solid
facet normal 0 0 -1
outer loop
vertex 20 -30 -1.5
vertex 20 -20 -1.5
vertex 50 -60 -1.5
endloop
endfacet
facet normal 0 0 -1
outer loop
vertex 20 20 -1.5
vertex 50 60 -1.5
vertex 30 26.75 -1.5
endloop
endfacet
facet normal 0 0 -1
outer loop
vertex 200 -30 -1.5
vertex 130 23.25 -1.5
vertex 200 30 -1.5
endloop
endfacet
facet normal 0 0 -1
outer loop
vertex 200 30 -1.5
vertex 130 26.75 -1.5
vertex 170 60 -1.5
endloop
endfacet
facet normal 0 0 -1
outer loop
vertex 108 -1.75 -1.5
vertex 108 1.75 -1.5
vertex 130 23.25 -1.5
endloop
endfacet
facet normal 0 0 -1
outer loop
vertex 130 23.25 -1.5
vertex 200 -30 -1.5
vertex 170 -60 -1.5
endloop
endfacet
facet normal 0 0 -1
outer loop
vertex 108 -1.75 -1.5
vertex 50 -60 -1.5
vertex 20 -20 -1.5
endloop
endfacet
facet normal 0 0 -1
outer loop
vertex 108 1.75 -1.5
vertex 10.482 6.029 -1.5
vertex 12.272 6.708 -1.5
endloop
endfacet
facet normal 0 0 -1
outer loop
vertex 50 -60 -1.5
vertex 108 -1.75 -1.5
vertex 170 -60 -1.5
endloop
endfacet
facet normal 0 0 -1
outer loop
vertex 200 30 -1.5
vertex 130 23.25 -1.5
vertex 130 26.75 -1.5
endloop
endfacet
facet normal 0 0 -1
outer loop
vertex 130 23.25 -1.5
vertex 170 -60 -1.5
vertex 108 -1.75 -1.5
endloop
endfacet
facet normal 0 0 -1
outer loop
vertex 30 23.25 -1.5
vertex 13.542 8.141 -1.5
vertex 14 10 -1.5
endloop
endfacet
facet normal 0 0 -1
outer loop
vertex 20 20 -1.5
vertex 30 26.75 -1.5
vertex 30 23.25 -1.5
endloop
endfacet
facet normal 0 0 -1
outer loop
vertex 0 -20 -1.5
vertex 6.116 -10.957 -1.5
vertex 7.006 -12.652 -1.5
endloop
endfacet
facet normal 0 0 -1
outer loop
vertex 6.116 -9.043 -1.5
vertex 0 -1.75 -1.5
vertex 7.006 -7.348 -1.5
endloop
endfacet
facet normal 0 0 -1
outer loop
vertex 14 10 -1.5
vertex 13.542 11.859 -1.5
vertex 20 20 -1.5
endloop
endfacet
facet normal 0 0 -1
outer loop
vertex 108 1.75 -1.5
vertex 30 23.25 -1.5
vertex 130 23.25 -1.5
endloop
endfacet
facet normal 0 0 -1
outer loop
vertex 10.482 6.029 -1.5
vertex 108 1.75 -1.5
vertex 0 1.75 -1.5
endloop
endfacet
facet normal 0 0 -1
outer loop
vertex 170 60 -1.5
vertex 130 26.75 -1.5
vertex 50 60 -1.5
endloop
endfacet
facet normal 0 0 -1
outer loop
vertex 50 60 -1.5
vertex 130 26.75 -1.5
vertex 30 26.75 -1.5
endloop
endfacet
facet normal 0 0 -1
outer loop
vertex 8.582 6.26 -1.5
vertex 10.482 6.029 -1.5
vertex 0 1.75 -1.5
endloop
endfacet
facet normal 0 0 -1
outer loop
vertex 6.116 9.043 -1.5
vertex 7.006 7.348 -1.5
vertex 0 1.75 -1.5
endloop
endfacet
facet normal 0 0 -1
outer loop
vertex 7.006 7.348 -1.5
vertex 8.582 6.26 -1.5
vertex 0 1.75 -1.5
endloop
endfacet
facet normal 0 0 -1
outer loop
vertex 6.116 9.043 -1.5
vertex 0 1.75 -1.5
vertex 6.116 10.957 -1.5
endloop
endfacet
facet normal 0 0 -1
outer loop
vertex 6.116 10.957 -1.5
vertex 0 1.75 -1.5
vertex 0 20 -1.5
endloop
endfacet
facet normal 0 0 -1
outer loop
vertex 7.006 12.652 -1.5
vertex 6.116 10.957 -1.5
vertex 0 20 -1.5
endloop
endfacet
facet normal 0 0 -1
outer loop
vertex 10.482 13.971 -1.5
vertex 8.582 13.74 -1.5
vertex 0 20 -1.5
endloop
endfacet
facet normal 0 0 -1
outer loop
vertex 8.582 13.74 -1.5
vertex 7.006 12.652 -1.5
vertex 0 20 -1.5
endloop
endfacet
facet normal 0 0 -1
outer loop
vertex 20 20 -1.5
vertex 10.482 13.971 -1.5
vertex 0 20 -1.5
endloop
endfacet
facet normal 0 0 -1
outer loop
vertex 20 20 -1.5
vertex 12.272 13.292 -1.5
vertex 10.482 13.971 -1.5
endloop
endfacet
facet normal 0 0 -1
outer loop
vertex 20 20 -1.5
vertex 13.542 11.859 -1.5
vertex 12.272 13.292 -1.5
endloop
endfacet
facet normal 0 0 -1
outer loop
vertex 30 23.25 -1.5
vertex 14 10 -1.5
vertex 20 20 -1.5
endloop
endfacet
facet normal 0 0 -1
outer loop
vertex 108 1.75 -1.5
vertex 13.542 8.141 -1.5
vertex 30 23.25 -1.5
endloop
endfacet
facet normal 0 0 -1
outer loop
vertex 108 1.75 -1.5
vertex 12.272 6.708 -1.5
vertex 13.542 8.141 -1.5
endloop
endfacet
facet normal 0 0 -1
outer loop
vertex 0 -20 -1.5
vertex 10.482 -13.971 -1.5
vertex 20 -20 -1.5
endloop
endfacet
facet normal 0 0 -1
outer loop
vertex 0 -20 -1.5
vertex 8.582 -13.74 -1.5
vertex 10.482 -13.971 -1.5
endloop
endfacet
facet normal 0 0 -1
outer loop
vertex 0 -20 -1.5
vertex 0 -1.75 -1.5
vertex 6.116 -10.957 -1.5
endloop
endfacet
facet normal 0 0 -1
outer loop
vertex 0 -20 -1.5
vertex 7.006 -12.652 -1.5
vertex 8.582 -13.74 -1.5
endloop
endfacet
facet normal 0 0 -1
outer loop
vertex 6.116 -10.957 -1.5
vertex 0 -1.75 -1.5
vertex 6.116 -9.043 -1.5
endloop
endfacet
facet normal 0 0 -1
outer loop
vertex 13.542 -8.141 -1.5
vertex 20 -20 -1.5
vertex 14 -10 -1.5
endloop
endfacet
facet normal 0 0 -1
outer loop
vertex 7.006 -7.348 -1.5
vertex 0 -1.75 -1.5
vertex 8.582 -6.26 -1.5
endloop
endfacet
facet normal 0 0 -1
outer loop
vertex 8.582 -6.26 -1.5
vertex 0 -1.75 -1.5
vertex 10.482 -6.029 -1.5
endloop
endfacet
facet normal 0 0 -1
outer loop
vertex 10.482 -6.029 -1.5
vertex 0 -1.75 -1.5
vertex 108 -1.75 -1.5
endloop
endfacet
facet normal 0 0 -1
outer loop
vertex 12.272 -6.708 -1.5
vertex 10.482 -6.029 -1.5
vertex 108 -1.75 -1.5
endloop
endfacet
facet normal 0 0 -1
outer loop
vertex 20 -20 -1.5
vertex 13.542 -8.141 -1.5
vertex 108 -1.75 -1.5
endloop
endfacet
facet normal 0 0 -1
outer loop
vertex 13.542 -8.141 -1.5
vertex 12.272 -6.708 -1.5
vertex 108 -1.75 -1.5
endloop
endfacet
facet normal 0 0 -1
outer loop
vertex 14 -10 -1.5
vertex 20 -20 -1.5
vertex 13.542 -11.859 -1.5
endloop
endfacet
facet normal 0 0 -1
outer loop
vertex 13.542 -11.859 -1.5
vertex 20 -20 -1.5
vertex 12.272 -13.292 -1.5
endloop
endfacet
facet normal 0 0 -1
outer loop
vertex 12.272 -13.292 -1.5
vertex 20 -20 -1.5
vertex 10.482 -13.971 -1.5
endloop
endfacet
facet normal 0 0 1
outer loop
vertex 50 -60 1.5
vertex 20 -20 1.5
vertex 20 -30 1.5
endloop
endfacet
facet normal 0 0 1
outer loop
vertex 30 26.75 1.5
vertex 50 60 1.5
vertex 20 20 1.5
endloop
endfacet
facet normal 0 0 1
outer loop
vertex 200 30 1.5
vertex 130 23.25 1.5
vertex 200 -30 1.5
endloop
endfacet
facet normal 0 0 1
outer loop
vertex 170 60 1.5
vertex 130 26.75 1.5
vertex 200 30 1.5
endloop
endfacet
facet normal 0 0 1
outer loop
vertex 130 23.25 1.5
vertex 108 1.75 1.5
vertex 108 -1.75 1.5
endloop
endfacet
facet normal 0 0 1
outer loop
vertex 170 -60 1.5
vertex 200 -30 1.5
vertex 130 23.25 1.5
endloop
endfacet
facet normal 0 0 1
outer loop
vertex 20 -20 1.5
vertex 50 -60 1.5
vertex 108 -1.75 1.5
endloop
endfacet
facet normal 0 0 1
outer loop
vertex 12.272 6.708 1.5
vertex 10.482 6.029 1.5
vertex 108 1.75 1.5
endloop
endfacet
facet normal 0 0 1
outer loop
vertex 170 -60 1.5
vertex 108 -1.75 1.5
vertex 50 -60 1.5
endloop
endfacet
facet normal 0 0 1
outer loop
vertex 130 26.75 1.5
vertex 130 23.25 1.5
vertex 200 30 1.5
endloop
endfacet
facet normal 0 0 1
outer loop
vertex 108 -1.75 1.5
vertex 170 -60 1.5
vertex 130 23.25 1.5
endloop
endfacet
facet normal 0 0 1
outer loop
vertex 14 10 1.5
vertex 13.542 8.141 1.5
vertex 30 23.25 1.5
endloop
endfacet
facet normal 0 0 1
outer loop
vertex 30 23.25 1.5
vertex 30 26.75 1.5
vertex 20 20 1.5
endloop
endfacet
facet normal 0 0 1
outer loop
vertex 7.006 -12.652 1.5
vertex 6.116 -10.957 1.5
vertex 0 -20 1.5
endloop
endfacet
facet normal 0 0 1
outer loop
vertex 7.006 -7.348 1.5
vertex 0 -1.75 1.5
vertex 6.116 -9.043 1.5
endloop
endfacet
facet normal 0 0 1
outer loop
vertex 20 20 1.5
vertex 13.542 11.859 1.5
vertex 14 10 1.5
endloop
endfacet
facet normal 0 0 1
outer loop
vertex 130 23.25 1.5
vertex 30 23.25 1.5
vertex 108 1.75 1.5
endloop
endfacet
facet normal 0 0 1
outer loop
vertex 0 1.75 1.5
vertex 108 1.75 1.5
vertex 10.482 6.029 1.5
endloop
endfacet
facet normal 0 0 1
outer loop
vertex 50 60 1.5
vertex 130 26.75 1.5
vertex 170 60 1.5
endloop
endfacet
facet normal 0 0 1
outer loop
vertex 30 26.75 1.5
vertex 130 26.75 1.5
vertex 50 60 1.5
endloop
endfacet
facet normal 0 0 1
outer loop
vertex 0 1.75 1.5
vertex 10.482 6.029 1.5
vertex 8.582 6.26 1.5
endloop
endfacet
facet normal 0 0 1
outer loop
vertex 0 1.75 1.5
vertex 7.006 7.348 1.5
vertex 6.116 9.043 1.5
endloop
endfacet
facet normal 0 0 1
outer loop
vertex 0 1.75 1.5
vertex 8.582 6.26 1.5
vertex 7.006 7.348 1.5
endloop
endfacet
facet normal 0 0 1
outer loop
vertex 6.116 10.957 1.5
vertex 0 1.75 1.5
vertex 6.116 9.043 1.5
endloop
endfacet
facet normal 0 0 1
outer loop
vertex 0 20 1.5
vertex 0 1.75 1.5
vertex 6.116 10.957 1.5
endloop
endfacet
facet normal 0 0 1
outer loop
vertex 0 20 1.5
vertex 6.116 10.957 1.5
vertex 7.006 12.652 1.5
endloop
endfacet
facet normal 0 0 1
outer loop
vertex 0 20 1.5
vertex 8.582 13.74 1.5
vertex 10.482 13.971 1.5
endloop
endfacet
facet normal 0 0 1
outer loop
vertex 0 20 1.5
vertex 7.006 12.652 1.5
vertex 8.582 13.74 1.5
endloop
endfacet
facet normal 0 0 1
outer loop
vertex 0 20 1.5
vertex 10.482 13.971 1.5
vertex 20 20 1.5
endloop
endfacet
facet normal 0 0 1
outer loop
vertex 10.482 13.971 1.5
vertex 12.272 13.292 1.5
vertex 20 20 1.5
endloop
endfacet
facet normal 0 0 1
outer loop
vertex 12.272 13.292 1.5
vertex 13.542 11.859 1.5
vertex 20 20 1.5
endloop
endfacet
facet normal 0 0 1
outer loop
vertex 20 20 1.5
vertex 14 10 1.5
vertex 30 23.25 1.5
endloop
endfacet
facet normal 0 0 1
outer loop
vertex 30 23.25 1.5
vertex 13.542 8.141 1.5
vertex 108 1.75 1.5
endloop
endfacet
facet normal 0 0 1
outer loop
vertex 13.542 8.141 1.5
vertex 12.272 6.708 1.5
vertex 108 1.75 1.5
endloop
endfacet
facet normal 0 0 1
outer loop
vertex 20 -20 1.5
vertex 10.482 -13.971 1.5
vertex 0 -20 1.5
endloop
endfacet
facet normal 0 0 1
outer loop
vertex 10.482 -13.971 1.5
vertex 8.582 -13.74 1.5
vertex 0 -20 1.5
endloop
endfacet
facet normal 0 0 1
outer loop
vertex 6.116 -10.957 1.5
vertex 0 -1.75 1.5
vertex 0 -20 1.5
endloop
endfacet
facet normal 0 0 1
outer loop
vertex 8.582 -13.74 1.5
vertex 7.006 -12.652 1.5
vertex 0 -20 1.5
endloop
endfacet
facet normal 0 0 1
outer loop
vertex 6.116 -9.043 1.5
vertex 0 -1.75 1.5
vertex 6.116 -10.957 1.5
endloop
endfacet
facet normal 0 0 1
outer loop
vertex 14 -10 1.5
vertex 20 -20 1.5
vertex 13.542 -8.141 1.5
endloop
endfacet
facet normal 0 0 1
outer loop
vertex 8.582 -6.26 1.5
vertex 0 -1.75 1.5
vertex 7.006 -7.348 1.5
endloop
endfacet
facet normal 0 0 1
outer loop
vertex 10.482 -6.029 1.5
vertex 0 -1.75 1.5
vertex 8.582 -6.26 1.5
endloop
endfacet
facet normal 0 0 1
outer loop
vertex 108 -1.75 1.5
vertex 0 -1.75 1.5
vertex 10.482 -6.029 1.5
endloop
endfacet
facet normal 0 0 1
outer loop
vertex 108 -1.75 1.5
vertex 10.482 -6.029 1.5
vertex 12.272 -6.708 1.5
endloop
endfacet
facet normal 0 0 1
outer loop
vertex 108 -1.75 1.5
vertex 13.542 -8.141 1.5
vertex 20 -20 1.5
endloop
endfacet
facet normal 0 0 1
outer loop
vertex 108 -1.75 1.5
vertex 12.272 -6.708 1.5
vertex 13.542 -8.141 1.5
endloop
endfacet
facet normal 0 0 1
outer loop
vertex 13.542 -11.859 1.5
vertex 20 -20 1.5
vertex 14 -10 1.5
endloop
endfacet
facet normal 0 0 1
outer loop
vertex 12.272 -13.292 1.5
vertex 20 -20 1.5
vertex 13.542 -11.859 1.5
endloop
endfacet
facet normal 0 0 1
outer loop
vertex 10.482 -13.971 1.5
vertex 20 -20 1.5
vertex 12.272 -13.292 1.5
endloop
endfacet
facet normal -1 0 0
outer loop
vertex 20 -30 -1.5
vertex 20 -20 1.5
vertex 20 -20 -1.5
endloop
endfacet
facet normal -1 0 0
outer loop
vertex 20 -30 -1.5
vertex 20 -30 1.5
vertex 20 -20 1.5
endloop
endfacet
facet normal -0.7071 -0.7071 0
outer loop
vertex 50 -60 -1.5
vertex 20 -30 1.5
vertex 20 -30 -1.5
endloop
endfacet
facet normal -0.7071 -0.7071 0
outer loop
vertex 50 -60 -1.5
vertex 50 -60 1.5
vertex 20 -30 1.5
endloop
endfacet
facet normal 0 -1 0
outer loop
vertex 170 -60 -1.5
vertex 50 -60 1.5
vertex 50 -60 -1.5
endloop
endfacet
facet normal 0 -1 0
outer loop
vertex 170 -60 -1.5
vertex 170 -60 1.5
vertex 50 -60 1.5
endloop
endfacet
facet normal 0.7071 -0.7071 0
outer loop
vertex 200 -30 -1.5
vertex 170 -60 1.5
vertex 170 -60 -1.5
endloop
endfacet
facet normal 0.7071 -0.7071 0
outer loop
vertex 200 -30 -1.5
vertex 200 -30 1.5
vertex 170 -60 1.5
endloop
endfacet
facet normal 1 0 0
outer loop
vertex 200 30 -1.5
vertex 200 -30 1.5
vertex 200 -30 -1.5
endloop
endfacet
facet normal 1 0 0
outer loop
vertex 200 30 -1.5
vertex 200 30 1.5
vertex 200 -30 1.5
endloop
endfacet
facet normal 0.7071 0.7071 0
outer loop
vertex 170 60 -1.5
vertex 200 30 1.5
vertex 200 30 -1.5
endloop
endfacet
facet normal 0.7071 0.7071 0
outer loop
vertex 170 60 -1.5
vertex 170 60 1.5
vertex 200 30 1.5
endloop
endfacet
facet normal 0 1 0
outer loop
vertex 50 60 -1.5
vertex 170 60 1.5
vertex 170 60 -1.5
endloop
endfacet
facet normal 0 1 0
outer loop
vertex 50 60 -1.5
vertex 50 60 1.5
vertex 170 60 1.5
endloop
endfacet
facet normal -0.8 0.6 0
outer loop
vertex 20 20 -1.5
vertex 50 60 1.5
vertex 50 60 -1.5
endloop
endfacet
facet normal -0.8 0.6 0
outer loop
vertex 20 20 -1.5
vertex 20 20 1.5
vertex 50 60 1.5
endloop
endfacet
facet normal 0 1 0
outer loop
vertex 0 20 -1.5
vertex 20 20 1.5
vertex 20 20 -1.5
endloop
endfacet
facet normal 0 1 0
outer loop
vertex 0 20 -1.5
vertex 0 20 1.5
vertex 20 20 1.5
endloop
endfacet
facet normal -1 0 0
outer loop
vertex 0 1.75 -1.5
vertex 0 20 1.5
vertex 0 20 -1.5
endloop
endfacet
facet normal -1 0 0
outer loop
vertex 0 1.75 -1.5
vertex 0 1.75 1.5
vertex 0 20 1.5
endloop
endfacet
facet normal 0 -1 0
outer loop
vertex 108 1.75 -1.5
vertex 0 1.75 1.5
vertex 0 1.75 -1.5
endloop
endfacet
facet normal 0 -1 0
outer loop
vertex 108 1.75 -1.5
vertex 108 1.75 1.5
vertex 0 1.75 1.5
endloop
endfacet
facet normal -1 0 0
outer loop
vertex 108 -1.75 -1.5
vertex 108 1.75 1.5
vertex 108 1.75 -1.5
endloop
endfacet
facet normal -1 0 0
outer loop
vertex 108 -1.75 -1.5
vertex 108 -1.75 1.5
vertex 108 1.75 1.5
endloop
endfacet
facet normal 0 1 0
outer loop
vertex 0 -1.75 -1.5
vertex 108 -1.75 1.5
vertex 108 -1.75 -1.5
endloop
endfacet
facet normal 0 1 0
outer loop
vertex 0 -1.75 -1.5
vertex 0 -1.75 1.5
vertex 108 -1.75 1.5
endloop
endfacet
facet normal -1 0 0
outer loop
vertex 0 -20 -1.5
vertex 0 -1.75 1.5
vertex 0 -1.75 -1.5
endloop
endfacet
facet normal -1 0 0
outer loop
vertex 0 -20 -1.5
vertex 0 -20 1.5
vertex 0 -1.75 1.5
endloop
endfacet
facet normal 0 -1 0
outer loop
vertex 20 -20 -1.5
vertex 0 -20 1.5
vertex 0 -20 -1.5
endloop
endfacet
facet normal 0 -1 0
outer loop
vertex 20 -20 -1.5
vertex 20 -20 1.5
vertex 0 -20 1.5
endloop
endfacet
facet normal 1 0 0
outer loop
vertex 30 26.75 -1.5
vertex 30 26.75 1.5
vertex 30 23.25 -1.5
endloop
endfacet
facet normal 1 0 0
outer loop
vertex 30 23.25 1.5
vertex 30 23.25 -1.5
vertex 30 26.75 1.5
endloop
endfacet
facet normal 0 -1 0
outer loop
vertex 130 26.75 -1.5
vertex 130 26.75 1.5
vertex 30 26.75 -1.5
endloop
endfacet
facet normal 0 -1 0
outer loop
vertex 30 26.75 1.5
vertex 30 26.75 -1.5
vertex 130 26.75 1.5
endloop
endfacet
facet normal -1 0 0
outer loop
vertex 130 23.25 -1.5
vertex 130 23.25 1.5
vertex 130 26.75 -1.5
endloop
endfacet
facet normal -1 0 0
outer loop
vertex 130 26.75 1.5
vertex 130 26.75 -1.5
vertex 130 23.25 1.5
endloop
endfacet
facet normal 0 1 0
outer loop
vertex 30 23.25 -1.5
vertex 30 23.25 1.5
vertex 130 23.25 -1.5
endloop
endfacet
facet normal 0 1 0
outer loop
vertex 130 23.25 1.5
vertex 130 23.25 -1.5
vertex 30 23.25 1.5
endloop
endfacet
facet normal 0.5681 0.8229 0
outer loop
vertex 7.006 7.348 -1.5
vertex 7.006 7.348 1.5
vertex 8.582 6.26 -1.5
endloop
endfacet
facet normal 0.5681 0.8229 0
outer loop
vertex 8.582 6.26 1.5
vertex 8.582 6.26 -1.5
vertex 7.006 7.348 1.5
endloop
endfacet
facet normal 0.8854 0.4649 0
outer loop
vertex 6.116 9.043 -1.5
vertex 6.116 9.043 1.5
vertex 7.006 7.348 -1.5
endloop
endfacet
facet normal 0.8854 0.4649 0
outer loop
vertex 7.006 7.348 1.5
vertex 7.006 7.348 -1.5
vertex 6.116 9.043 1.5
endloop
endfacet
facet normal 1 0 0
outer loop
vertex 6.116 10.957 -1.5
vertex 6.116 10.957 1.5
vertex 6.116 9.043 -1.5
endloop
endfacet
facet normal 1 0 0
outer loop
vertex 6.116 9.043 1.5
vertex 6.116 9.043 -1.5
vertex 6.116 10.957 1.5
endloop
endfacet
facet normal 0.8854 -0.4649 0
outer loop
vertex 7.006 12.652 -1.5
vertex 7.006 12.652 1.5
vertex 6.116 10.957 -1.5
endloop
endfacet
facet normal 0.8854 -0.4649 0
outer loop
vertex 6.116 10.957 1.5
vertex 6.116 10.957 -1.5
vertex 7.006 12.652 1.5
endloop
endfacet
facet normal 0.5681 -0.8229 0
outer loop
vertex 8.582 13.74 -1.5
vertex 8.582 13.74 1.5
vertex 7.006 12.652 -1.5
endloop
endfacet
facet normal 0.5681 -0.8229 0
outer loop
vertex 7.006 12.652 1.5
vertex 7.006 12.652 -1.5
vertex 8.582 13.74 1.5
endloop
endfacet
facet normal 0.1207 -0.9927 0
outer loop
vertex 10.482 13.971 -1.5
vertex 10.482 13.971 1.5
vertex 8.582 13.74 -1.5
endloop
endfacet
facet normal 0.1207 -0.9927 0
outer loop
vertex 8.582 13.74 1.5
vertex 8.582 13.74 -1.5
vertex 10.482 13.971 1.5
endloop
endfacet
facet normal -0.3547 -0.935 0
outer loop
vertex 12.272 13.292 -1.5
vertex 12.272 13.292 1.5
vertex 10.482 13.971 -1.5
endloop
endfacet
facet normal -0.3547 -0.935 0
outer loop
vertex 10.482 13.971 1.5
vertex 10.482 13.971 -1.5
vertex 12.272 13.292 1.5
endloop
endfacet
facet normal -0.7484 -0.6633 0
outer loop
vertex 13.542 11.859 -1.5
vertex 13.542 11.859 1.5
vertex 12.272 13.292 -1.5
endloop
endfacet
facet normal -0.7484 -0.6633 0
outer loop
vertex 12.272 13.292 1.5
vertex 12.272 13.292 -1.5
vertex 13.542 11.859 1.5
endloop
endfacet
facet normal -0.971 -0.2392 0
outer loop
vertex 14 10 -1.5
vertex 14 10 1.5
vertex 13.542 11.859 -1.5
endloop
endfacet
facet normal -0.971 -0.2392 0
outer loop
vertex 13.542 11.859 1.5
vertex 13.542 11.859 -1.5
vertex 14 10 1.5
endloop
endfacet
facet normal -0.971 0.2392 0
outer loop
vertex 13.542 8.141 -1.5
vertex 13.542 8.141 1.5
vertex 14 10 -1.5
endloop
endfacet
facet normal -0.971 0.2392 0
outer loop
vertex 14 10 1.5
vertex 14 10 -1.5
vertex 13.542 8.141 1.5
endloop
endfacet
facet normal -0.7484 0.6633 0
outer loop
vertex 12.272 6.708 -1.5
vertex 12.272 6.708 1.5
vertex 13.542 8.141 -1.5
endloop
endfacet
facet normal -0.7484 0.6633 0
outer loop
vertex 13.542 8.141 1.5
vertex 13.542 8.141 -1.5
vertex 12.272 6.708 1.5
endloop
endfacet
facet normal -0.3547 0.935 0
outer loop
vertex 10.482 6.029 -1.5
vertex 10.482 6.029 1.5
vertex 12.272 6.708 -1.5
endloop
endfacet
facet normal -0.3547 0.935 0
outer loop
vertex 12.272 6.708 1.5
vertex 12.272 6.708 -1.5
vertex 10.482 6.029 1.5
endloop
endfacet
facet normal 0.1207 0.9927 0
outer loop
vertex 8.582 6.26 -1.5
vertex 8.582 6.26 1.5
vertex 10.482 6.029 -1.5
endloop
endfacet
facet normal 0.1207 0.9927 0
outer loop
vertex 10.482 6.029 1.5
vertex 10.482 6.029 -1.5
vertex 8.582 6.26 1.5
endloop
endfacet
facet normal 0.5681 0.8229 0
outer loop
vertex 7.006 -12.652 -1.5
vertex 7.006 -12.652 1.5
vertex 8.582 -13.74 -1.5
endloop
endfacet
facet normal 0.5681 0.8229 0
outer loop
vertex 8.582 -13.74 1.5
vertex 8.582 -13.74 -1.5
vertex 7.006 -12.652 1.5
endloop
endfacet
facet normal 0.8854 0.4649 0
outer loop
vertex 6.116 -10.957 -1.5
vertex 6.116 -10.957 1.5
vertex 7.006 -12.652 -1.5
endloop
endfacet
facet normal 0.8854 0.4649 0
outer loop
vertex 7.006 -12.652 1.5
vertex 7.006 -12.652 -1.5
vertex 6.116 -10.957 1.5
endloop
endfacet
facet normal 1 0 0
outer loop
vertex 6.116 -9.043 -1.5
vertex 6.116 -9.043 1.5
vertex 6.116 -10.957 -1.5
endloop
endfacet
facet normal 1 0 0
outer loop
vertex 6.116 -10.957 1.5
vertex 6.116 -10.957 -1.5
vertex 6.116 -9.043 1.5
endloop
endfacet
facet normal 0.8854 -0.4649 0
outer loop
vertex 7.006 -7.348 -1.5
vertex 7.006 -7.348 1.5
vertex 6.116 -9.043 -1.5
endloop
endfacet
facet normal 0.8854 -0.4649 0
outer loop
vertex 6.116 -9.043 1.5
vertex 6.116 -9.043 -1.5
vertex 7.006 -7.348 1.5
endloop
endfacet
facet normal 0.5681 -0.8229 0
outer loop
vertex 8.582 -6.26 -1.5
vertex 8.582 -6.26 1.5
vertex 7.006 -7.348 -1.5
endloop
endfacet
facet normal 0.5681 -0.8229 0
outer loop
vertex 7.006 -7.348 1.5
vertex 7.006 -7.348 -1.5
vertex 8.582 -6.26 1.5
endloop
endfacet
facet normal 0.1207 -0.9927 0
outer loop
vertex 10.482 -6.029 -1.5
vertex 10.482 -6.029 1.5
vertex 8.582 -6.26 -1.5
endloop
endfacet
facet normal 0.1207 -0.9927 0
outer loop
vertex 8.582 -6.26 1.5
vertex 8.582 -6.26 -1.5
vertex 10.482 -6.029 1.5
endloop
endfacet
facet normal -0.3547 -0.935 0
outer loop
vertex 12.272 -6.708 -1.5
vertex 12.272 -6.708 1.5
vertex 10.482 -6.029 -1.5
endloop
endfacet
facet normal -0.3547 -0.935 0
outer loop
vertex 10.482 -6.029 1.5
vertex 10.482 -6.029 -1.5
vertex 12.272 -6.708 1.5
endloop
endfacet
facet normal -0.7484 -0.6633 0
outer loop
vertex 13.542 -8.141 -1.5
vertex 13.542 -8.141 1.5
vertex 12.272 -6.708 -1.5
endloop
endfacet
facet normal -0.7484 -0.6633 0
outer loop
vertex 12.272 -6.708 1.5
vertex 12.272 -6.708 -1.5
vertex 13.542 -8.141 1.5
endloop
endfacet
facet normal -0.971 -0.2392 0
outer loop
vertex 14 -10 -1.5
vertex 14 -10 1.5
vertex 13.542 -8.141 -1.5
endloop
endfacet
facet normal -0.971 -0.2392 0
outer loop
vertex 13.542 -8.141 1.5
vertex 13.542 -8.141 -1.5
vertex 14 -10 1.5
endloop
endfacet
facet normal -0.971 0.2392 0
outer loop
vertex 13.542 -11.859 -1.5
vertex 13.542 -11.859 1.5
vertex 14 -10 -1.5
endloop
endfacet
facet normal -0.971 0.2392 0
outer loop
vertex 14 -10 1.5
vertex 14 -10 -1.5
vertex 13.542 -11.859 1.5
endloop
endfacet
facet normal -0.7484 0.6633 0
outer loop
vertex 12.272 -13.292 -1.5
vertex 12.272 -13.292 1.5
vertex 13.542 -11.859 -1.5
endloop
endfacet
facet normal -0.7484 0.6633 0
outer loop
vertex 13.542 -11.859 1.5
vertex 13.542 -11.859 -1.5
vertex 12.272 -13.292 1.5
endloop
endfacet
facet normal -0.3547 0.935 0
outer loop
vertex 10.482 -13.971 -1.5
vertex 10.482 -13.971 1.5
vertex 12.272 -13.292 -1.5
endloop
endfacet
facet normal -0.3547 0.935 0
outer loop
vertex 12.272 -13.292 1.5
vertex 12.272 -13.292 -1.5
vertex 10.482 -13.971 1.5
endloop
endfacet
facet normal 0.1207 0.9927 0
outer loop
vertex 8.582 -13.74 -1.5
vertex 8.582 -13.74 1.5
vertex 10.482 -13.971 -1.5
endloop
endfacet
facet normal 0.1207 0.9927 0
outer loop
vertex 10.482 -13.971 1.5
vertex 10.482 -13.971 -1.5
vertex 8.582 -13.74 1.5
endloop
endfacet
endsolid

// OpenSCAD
/*
    OpenSCAD Model for a Bug Trap Panel
    Modified to match the provided outline image:
    - Octagonal shape with angled corners
    - Single tab on left side with holes
    - Centered connecting slot that goes through the tab and halfway across body
    - Off-center closed slot within the material
    - Proportions adjusted to match the outline
*/

// ============== Configurable Parameters ==============

// Overall dimensions of the panel
panel_width = 200; // Total width including tab
panel_height = 120; // Total height at the widest point (increased for better proportions)
material_thickness = 3; // Thickness of the material

// Tab dimensions (only on left side)
tab_width = 20; // Slightly wider for better proportion
tab_height = 40; // Taller to match outline
hole_diameter = 8; // Slightly larger holes
hole_spacing = 20; // More spacing between holes

// Main body dimensions (excluding tab)
body_width = panel_width - tab_width; // Body width after the tab

// Slot dimensions
center_slot_length = body_width * 0.6; // Extends from tab through 60% across body
center_slot_height = material_thickness + 0.5; // Slightly wider slot
off_center_slot_length = 100; // Length of the closed off-center slot
off_center_slot_height = material_thickness + 0.5;
off_center_slot_y_offset = 25; // Position above center

// Octagonal shape parameters (more cuts for better match to outline)
corner_cut_length = 30; // Length of diagonal cuts
corner_cut_angle = 30; // Angle of the cuts


// ============== Module Definition ==============

module bug_trap_panel() {
    // Use linear_extrude to give the 2D shape thickness
    linear_extrude(height = material_thickness, center = true) {
        // Use difference to cut out the slots and holes
        difference() {
            // 1. The main outer polygon shape with octagonal body and single tab on left
            polygon(points = [
                // Start from top-left tab and go clockwise
                [0, tab_height/2], // Top of left tab
                [tab_width, tab_height/2], // End of left tab top
                
                // Octagonal body - going clockwise from top-left
                [tab_width + corner_cut_length, panel_height/2], // Top left angled edge start
                [panel_width - corner_cut_length, panel_height/2], // Top edge
                [panel_width, panel_height/2 - corner_cut_length], // Top right angled edge
                [panel_width, -(panel_height/2 - corner_cut_length)], // Right edge
                [panel_width - corner_cut_length, -panel_height/2], // Bottom right angled edge
                [tab_width + corner_cut_length, -panel_height/2], // Bottom edge
                [tab_width, -panel_height/2 + corner_cut_length], // Bottom left angled area
                
                // Left tab bottom
                [tab_width, -tab_height/2],
                [0, -tab_height/2] // Bottom of left tab
            ]);

            // 2. The shapes to subtract (slots and holes)
            
            // Centered connecting slot (goes through tab and partway across body)
            translate([center_slot_length/2, 0, 0]) {
                square([center_slot_length, center_slot_height], center=true);
            }
            
            // Off-center closed slot (contained within the body material)
            translate([tab_width + off_center_slot_length/2 + 10, off_center_slot_y_offset, 0]) {
                square([off_center_slot_length, off_center_slot_height], center=true);
            }
            
            // Holes in the left tab
            translate([tab_width/2, hole_spacing/2, 0]) {
                circle(d = hole_diameter);
            }
            translate([tab_width/2, -hole_spacing/2, 0]) {
                circle(d = hole_diameter);
            }
        }
    }
}


// ============== Instantiation ==============

// Show a single panel by default
bug_trap_panel();


/*
// --- Assembly View ---
// Uncomment the block below to see how two panels would interlock.
// The centered slot allows one panel to slide halfway into another,
// while the off-center slot provides additional functionality.

module assembly() {
    // First panel
    bug_trap_panel();
    
    // Second panel, rotated 180 degrees and positioned to interlock
    translate([panel_width/2, 0, material_thickness + 1]) {
        rotate([0, 180, 0]) {
            bug_trap_panel();
        }
    }
}

// assembly(); // Uncomment this line to show the assembly
*/
